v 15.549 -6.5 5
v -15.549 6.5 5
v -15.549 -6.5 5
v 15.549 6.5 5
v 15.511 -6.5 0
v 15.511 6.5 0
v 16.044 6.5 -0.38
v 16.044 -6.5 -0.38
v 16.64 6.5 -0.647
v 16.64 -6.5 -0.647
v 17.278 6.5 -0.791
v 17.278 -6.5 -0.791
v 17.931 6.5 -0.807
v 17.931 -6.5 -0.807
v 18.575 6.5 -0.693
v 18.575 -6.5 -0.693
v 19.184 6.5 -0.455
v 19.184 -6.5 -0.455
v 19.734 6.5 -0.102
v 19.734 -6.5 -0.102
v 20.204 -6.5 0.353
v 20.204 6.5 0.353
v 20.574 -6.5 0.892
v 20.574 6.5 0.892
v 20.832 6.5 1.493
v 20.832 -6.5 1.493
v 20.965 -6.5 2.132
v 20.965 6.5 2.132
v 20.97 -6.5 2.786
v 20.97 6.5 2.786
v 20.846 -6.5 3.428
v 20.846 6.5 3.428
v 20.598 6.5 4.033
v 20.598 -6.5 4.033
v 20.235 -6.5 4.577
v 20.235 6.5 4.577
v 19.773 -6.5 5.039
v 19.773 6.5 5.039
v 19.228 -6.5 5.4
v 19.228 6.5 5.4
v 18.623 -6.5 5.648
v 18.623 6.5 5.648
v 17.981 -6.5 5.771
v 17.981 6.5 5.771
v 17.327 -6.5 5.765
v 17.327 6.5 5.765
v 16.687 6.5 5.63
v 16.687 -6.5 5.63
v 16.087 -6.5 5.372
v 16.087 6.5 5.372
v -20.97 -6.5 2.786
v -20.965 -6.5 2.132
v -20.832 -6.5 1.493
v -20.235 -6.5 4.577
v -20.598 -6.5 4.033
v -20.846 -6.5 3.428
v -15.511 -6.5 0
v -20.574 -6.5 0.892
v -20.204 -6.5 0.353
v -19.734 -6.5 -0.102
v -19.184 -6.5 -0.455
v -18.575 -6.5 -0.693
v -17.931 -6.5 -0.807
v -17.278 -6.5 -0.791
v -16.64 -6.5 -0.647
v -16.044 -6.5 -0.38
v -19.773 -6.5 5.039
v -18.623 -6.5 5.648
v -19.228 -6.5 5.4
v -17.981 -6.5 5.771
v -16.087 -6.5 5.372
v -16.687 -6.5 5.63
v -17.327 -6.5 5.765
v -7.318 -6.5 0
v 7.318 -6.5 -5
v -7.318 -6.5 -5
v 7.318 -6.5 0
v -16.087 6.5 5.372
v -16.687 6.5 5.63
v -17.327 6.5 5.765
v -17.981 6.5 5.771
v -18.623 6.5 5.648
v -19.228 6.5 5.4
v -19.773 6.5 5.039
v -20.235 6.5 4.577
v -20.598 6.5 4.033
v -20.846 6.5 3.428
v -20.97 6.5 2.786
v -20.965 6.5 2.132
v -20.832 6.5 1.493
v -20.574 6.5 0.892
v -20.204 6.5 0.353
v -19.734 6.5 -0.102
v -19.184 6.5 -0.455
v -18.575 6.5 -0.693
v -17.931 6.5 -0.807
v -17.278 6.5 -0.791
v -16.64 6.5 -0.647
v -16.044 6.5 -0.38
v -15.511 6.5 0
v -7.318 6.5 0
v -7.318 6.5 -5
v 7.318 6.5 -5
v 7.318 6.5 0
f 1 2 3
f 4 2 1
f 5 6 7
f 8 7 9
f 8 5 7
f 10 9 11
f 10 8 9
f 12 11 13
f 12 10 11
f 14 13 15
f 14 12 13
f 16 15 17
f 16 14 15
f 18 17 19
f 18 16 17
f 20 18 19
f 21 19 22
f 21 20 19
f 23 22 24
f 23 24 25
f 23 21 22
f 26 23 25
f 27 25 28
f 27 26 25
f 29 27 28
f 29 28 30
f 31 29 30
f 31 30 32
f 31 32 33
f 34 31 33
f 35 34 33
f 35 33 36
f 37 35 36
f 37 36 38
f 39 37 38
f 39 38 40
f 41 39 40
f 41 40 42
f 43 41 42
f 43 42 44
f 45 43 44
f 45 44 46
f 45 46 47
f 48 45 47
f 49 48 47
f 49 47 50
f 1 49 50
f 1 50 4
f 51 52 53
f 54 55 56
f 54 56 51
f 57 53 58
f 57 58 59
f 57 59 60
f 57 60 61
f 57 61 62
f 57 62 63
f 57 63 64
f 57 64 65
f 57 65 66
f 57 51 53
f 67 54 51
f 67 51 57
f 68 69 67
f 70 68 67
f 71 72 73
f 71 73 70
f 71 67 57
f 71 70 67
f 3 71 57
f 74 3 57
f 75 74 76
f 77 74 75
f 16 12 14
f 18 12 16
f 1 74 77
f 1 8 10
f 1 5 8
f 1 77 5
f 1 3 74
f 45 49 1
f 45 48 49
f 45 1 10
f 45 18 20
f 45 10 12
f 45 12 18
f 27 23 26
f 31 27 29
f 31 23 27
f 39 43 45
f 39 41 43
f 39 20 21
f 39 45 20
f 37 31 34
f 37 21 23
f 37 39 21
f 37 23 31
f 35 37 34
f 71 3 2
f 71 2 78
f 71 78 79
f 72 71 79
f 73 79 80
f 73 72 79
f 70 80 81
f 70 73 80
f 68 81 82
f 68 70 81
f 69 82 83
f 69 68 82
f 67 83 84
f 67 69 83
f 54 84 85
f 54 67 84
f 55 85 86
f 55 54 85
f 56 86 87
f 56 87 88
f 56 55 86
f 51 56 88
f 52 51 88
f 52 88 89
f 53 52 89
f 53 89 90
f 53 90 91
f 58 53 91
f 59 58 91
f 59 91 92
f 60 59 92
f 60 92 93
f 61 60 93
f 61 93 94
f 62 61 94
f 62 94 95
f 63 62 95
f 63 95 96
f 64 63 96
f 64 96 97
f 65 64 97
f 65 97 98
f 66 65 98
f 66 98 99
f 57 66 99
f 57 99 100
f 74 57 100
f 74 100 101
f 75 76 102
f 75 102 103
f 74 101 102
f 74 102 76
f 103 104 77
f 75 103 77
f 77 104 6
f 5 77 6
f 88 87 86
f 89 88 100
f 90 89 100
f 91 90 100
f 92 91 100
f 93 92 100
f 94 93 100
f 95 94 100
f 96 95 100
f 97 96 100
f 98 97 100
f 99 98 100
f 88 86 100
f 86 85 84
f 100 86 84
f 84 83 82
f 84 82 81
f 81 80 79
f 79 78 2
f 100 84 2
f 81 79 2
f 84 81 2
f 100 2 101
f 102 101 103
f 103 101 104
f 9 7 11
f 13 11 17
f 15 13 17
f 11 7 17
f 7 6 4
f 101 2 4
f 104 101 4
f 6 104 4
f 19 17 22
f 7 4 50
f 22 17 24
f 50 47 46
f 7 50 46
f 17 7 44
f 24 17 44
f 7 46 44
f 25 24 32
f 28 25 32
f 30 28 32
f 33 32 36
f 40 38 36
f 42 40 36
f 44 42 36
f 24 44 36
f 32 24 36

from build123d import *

# Parameters (mm, degrees)
SKETCH005_W  = 14.63643
SKETCH005_H  = 13
PAD004_DEPTH = 5
SKETCH_W     = 35
SKETCH_H     = 13
PAD_DEPTH    = 5
SKETCH003_R  = 3.3
PAD003_DEPTH = 13


with BuildPart() as pad004:
    # Sketch005 → Pad004 (new body)
    with BuildSketch(Plane(origin=(0, 0, 0), x_dir=(1, 0, 0), z_dir=(0, 0, -1))):
        Rectangle(SKETCH005_W, SKETCH005_H)
    extrude(amount=PAD004_DEPTH)


with BuildPart() as fusion:
    # Sketch → Pad (new body)
    with BuildSketch(Plane.XY):
        Rectangle(SKETCH_W, SKETCH_H)
    extrude(amount=PAD_DEPTH)

    # Sketch003 → Pad003 (new body)
    with BuildSketch(Plane.XZ.offset(6.5)):
        with Locations((17.683945, 2.483897)):
            Circle(SKETCH003_R)
        with Locations((-17.683945, 2.483897)):
            Circle(SKETCH003_R)
    extrude(amount=-PAD003_DEPTH)

    # Fusion: union Pad004
    add(pad004.part)


solid = fusion.part
